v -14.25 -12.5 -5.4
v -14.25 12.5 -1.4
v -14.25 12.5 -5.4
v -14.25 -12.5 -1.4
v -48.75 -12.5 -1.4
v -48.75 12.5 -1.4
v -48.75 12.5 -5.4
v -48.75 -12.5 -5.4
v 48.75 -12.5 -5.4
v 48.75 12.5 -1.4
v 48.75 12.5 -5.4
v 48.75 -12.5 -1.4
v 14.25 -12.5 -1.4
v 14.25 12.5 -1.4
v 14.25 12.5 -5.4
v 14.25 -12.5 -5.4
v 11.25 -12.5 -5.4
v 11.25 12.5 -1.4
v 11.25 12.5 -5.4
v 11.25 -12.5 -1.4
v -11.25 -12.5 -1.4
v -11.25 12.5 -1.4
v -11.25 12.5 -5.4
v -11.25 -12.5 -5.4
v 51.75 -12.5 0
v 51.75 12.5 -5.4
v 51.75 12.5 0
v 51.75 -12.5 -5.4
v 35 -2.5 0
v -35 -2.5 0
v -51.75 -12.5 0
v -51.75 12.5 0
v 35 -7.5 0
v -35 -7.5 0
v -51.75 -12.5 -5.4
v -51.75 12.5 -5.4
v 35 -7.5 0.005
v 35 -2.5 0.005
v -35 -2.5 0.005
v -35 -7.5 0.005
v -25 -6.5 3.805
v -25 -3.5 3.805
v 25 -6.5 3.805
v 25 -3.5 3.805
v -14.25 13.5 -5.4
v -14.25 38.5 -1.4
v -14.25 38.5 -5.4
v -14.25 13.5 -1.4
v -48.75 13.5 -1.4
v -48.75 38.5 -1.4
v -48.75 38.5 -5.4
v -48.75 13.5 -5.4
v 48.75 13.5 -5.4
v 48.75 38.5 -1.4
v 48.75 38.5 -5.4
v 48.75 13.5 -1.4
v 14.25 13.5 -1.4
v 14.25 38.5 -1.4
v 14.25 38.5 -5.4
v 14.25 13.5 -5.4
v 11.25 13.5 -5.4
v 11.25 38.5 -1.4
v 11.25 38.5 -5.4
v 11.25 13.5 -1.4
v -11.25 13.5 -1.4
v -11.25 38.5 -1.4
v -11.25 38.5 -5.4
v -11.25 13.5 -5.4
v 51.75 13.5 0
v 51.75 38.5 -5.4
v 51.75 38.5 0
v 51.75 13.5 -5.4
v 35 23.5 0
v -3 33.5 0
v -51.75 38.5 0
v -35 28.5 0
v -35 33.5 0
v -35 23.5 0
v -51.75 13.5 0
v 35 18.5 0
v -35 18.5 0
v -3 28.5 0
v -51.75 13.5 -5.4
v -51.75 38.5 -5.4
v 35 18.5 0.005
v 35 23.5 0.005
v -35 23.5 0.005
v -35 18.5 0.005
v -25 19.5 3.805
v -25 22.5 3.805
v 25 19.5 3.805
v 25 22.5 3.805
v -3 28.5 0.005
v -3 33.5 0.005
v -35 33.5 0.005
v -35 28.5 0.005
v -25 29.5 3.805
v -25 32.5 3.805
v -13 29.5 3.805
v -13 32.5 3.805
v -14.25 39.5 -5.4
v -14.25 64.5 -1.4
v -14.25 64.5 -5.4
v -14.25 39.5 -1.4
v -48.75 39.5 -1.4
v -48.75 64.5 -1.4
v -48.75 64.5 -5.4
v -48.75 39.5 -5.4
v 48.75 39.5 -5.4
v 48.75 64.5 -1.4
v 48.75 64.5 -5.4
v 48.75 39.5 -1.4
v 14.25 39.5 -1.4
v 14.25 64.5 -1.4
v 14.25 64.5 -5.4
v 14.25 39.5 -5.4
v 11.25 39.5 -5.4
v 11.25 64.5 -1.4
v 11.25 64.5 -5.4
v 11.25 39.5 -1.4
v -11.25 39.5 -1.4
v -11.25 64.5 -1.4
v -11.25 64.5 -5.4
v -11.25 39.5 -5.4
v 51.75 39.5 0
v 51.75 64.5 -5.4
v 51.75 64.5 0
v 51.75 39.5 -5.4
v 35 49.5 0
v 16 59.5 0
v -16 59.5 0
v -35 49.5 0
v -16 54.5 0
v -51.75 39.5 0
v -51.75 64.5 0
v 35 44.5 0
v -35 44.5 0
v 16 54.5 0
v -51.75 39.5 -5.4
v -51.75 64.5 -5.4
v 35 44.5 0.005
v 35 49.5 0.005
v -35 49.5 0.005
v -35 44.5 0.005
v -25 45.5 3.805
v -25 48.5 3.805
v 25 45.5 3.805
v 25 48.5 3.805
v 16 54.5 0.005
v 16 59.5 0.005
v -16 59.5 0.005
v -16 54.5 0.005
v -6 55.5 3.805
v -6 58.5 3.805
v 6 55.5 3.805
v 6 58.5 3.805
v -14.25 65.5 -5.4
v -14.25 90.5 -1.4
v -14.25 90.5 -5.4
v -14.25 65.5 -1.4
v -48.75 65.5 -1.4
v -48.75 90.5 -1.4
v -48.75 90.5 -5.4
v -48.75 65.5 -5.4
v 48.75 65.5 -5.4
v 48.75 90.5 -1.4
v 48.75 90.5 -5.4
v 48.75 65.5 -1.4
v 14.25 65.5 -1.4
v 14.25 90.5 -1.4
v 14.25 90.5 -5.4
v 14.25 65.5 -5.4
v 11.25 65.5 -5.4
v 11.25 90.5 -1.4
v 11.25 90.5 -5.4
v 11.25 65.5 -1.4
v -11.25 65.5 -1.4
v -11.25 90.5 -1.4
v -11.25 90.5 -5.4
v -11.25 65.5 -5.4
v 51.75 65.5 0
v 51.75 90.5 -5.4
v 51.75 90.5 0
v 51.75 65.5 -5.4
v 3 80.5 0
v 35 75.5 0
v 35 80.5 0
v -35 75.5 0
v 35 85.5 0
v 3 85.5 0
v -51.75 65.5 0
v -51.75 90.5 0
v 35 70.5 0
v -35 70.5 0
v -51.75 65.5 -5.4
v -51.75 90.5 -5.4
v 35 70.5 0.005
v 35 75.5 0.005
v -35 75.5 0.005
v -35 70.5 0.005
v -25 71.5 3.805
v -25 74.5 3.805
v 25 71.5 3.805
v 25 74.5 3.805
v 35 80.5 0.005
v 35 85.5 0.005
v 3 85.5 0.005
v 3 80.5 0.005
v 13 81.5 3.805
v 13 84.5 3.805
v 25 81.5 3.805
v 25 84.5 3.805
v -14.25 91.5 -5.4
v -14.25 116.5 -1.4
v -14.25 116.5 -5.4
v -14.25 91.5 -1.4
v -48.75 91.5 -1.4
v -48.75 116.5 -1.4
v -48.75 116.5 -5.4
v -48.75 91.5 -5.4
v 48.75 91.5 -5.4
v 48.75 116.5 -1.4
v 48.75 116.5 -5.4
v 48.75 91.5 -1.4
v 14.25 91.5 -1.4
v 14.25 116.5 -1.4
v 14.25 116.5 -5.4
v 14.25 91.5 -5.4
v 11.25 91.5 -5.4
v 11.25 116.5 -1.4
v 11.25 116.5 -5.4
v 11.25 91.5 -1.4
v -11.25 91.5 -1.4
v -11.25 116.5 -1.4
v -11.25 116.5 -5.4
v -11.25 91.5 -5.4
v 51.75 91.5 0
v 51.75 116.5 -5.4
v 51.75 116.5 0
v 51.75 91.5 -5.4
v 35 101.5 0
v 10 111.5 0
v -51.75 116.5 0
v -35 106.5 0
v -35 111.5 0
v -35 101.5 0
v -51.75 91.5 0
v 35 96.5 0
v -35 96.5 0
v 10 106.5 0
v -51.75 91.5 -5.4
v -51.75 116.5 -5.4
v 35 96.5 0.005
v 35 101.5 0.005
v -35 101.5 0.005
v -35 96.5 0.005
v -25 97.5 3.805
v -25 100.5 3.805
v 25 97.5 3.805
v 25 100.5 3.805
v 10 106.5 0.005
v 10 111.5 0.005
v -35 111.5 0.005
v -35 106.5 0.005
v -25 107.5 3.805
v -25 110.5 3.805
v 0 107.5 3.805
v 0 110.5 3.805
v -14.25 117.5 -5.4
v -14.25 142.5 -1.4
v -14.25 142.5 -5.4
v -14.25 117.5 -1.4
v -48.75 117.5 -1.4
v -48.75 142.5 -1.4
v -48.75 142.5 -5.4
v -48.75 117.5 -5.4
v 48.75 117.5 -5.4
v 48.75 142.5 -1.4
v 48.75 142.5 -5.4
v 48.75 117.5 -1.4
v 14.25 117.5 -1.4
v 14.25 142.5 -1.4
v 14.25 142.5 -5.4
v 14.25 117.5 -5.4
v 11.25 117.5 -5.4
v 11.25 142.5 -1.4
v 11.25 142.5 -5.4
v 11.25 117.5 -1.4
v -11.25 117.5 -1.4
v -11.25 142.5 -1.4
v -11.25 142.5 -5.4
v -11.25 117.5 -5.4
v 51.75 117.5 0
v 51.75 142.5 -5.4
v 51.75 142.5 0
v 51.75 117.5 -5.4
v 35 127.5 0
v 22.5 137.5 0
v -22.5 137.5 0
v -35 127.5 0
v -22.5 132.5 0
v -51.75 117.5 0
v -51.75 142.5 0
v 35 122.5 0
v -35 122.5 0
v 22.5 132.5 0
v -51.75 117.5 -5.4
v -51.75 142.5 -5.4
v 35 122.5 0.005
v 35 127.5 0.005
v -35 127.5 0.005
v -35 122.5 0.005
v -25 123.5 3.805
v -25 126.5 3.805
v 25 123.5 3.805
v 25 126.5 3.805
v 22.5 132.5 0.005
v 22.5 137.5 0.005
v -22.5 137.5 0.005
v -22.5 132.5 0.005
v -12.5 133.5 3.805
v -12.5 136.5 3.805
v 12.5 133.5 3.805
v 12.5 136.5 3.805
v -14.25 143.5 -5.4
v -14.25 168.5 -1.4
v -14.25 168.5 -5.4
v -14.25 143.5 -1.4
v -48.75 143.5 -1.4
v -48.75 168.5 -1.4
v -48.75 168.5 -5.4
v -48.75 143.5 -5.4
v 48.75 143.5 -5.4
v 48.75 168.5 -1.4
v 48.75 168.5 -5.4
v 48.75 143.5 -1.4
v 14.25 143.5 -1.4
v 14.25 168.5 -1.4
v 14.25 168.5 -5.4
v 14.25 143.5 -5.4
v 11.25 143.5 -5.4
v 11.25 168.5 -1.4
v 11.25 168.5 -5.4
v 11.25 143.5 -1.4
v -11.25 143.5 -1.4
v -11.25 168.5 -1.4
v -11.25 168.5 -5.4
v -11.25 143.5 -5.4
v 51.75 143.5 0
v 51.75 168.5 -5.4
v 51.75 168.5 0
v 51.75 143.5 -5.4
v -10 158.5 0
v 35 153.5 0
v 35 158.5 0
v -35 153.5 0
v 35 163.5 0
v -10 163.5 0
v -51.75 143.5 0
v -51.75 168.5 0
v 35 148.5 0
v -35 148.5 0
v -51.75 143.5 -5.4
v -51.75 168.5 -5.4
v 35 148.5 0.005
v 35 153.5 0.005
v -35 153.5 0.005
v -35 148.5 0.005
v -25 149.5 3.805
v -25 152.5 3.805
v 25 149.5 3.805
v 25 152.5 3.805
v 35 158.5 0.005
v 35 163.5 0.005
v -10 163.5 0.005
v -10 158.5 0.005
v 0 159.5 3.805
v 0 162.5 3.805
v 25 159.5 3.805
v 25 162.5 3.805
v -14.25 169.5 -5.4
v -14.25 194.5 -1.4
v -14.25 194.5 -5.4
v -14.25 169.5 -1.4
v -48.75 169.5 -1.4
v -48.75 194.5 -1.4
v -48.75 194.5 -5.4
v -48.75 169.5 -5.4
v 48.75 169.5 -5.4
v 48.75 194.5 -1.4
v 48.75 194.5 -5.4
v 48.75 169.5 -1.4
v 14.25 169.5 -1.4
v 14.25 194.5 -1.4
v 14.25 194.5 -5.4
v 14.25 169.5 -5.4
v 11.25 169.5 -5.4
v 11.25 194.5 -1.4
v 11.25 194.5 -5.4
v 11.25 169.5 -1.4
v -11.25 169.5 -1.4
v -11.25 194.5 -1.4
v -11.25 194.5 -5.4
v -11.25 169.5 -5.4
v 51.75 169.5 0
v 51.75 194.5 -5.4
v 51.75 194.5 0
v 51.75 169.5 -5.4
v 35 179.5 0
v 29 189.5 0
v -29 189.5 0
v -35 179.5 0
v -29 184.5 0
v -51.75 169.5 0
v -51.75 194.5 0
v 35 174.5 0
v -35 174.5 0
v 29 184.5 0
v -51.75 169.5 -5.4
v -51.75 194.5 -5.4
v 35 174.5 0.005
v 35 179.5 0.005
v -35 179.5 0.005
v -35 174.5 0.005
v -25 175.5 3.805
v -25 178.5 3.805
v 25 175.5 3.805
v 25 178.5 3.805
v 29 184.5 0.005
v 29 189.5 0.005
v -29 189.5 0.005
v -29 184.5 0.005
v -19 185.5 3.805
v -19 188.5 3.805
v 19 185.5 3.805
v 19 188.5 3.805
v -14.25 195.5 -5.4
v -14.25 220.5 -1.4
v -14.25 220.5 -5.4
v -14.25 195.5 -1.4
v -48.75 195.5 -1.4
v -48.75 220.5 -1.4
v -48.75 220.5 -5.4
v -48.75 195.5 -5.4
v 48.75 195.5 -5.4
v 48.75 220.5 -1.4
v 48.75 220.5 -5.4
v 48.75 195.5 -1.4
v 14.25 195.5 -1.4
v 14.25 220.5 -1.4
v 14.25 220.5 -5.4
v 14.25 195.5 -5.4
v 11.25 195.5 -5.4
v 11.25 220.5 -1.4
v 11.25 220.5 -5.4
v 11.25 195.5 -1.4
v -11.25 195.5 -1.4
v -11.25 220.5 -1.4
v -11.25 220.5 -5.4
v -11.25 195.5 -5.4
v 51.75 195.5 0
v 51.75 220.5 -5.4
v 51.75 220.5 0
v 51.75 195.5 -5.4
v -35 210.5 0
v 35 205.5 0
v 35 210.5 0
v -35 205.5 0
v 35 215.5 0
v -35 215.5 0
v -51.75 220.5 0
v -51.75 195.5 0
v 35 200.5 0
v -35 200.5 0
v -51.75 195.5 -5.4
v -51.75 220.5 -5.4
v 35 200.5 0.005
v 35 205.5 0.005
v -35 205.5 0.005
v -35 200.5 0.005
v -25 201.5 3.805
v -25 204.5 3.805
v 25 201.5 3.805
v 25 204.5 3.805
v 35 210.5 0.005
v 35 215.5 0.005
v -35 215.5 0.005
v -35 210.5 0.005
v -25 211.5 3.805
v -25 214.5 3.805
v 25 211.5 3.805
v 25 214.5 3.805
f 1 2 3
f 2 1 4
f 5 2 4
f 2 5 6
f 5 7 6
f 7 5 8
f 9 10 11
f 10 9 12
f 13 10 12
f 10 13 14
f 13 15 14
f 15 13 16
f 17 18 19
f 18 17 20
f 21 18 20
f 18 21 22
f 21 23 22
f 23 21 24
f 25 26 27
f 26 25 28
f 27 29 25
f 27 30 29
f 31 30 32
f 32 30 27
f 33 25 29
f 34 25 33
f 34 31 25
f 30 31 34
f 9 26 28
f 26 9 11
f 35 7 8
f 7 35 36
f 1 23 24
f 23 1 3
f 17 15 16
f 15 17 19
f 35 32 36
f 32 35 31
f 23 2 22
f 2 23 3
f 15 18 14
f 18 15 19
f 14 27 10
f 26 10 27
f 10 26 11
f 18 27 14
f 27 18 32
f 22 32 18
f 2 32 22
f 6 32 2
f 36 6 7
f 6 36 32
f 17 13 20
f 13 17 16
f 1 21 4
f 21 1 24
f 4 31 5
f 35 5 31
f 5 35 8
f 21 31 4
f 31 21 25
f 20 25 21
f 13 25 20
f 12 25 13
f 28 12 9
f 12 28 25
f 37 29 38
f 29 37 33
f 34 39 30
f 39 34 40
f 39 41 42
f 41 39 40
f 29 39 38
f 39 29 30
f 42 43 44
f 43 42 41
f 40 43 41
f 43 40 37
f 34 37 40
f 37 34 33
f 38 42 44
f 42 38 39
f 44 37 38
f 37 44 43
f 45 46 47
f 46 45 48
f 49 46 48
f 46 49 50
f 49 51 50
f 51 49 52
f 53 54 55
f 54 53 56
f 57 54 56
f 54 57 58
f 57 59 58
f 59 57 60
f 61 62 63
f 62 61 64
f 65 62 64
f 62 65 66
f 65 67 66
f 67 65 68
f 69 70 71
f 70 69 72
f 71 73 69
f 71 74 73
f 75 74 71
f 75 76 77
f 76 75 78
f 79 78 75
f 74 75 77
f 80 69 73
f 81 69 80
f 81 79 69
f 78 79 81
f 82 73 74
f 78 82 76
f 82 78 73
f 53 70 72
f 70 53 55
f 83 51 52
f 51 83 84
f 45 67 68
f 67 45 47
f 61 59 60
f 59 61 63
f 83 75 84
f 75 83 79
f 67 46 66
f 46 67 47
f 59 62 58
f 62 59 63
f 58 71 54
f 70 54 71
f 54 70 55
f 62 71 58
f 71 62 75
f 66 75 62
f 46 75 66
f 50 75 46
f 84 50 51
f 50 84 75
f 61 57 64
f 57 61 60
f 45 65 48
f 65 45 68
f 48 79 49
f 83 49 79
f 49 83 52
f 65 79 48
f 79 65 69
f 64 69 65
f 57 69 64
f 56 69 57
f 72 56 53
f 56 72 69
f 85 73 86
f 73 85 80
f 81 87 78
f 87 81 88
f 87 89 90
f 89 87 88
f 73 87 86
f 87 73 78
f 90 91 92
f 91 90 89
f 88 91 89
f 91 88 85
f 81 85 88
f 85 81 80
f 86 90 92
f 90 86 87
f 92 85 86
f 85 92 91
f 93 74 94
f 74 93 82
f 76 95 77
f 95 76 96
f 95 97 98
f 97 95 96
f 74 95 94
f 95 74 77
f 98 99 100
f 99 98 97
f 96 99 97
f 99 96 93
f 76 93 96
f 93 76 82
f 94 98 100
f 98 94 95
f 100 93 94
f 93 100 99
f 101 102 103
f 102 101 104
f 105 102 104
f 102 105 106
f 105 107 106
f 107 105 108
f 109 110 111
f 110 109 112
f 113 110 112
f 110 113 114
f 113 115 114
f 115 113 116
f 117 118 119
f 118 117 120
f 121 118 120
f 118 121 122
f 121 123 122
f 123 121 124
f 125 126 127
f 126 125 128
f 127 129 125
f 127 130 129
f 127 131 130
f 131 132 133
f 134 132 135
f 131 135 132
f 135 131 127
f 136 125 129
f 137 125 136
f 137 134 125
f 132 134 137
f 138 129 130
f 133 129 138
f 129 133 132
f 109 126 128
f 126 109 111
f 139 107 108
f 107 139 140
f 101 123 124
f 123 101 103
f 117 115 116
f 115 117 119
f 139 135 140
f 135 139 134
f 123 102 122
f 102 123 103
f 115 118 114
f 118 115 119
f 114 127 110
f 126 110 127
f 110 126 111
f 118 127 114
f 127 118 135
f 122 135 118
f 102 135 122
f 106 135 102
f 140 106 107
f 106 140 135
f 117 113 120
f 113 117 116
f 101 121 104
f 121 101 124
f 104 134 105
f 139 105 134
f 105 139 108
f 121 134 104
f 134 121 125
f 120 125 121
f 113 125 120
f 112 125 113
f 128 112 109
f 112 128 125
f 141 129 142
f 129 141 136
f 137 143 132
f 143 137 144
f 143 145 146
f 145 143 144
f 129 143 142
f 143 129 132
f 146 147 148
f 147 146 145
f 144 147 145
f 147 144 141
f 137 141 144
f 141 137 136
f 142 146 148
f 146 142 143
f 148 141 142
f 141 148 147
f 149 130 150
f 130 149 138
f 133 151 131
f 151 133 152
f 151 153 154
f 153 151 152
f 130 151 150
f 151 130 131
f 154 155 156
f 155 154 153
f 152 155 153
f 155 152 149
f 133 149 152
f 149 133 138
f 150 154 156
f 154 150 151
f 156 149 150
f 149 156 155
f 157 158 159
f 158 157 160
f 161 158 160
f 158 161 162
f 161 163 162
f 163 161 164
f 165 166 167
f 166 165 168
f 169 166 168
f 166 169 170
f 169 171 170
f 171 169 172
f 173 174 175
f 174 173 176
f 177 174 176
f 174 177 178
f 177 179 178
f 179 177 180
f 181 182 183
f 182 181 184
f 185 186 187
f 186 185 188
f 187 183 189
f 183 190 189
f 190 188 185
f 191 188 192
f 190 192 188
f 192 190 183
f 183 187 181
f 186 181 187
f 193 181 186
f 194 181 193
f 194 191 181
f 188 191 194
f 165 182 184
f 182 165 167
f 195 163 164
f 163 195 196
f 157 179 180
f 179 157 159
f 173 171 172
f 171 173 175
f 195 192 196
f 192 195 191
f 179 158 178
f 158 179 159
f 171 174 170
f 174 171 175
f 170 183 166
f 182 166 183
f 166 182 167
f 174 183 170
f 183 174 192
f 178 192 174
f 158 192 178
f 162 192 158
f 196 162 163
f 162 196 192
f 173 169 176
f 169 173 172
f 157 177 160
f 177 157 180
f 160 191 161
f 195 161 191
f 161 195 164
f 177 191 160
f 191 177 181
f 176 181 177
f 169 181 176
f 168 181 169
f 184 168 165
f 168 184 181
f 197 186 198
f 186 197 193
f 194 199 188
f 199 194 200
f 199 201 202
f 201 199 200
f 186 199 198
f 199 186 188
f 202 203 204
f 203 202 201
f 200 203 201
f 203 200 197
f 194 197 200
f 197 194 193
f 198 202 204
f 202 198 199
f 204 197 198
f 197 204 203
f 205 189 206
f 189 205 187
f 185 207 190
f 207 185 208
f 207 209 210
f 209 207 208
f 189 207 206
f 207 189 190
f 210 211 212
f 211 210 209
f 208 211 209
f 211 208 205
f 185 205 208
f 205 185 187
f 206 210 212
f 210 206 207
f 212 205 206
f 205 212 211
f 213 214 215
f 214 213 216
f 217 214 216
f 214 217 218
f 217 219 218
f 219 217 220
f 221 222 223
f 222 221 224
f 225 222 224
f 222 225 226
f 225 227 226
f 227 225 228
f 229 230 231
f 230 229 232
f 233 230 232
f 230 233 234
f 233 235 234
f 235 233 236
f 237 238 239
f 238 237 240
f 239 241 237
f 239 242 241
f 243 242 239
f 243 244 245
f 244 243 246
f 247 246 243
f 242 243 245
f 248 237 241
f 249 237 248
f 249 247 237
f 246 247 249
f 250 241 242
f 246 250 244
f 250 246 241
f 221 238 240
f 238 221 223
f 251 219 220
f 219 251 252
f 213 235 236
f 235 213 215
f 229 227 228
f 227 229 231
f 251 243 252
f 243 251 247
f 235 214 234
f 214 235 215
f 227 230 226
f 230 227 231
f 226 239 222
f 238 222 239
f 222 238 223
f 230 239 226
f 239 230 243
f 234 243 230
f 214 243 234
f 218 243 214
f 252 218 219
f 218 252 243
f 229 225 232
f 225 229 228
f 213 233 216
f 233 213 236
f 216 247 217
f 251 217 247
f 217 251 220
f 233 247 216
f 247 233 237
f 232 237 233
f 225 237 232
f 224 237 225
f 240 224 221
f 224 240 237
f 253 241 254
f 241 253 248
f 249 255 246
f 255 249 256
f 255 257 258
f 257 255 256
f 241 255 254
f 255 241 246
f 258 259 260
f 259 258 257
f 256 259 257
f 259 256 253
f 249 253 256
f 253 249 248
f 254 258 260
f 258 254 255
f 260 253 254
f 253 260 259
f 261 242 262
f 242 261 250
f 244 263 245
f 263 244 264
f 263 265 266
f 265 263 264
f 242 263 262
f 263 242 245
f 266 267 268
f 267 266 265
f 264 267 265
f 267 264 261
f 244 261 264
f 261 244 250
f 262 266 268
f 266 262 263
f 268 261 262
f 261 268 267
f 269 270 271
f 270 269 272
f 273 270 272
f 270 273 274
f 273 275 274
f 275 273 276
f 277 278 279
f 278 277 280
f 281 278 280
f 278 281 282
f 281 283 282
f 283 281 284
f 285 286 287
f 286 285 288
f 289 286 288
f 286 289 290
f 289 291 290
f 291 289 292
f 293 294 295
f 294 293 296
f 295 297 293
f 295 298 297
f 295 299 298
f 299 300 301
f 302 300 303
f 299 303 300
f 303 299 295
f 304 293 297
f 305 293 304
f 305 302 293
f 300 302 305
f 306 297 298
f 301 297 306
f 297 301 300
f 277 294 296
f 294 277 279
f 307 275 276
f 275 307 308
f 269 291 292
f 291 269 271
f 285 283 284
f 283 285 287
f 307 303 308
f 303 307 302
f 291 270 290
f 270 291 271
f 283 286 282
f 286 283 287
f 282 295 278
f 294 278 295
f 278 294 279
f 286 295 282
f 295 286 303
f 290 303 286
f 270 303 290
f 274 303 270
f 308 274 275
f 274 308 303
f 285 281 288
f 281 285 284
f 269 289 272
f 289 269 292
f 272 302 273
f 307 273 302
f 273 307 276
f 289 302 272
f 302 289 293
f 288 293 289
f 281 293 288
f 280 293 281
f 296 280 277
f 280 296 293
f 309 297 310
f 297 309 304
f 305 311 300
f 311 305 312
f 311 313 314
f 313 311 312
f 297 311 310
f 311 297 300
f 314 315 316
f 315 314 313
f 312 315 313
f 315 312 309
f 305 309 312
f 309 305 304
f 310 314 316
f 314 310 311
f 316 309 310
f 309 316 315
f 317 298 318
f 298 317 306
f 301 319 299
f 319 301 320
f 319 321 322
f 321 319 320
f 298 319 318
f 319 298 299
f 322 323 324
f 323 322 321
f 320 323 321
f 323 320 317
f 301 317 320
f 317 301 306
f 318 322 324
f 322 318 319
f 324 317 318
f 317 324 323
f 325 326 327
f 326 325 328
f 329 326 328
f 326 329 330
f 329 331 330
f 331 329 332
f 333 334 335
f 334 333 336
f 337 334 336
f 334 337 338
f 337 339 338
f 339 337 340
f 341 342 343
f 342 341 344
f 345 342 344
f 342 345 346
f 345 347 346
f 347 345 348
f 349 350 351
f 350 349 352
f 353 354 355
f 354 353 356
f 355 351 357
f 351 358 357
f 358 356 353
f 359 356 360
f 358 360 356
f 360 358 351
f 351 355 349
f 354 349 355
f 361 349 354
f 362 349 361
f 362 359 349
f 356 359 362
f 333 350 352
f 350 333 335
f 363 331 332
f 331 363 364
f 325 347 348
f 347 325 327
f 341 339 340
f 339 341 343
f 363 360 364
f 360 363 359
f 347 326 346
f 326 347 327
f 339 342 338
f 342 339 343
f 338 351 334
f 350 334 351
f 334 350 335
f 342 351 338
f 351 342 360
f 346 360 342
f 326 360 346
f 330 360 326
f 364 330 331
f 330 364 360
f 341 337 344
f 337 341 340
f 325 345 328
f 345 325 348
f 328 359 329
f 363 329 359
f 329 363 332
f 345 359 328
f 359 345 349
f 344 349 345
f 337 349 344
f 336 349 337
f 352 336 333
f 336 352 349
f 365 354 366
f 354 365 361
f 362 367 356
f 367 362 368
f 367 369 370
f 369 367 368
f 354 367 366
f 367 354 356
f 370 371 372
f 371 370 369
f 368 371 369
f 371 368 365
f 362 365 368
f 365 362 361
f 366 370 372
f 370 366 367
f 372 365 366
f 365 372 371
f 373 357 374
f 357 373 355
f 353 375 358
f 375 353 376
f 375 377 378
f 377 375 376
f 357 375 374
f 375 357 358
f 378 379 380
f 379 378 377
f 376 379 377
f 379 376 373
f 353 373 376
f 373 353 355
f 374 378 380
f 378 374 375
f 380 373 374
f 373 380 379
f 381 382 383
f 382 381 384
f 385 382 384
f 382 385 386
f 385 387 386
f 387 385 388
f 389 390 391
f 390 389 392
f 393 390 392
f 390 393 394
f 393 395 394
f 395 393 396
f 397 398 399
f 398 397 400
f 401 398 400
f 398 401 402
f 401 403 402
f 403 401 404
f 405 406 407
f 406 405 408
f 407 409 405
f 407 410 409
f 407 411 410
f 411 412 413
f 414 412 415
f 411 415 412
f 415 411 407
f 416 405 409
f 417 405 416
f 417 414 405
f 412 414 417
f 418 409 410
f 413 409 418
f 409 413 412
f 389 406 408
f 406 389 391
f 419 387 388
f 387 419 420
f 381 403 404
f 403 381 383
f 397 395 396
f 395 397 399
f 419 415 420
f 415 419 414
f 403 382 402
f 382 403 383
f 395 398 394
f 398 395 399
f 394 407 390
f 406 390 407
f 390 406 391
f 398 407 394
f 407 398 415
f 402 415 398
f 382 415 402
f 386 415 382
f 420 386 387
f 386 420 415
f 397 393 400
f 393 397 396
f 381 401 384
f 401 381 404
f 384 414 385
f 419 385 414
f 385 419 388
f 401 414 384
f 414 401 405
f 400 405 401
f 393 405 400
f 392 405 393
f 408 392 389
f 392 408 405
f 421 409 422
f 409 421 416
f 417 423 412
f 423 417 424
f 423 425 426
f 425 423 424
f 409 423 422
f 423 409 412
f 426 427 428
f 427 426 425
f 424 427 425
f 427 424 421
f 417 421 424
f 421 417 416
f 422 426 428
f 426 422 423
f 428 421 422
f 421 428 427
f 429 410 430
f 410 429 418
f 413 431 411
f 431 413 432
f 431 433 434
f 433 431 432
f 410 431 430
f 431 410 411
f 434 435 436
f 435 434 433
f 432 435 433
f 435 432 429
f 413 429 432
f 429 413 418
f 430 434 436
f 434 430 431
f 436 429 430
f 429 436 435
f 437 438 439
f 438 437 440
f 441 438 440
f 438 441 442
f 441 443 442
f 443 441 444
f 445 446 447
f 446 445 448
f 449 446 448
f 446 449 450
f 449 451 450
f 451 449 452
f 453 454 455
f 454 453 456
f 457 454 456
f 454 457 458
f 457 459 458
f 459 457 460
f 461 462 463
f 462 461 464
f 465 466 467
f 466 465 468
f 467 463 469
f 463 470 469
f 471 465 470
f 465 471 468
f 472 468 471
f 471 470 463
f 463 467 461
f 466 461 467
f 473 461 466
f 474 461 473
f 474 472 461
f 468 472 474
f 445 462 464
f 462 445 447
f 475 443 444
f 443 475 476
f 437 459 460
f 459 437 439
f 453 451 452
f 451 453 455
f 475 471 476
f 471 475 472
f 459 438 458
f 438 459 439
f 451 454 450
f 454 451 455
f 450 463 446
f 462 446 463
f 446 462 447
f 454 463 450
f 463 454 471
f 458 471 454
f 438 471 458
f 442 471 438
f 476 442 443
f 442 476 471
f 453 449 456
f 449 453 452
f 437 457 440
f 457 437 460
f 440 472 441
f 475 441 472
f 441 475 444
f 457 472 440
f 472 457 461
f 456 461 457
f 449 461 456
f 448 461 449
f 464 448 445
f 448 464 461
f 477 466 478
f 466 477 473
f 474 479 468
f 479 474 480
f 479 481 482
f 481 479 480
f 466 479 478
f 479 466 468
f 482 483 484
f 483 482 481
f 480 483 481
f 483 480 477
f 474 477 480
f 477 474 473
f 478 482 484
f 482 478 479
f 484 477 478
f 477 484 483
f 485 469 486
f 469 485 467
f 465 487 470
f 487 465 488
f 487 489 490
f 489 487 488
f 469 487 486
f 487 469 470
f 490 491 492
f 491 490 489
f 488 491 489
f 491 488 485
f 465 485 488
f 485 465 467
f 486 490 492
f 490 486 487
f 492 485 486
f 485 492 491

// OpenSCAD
$fn=50;

// modification of duplo figure leg for locomotive engineer
module driver()
{
  difference()
  {
    union()
    {
      cube([3,4.4,5.6],center=true);
      translate([0,0,-2.8])
        cylinder(d=3.5,h=5.4+5.6);
    }
    translate([0,0,-.6])
      cube([1.8,100,5.6],center=true);
  }
}


// intellitrain tiles
module tile(pos=0,len=1)
{
  Lsegment=31.5;
  L=Lsegment*3;
  W=25;
  gr=1.4;
  up=5.2-gr;
  down=4;
  space=32;
  
  Lbar1=12;
  Lbar2=25;
  Lbar3=38;
  Lbar4=50;
  
  lentab=[[1,Lbar1],[2,Lbar2],[3,Lbar3],[4,Lbar4]];
  
  off_axis=5;
  barW1=5;
  barW2=3;
  
  module bar(L=Lbar4)
  {
    hull()
    {
      cube([L+20,barW1,.01],center=true);
      translate([0,0,up])
        cube([L,barW2,.01],center=true);
    }
  }
    
  translate([0,0,-(down+gr)/2])
  {
    difference()
    {
      cube([L+9,W,down+gr],center=true);
      translate([0,0,-gr])
      {
        for(i=[-1,1])
          translate([i*Lsegment,0,0])
            cube([Lsegment+3,1000,down+gr],center=true);
        cube([Lsegment-9,1000,down+gr],center=true);
      }
    }
  }
  translate([0,-off_axis,0])
    bar();
  if( len>0 )
  {
    ll=lookup(len,lentab);
    translate([pos*(Lbar4-ll)/2,off_axis,0])
      bar(ll);
  }
}

//driver();

module tile_reverse(){  tile( 0,0);  }
module tile_station(){  tile(-1,1);  }
module tile_horn()   {  tile( 0,1);  }
module tile_shop()   {  tile( 1,1);  }
module tile_wash()   {  tile(-1,2);  }
module tile_cargo()  {  tile( 0,2);  }
module tile_tunnel() {  tile( 1,2);  }
module tile_notuse1(){  tile(-1,3);  }
module tile_fuel()   {  tile( 0,3);  }
module tile_notuse2(){  tile( 1,3);  }
module tile_stop()   {  tile( 0,4);  }

//tile_reverse();
//tile_station();
//tile_horn();
//tile_shop();
//tile_wash(); 
//tile_cargo();
//tile_tunnel();
//tile_fuel();
//tile_stop();


module alltiles(n=[0:1:8])
{
  alltiles_tab = [
    [ 0, 0 ],
    [-1, 1 ],
    [ 0, 1 ],
    [ 1, 1 ],
    [-1, 2 ],
    [ 0, 2 ],
    [ 1, 2 ],
    //[-1, 3 ],
    [ 0, 3 ],
    //[ 1, 3 ],
    [ 0, 4 ]
  ];

  for( nn=n )
  {
    i=alltiles_tab[nn];
    translate([0,nn*26,0])
      tile(i[0],i[1]);
  }
}

alltiles();
